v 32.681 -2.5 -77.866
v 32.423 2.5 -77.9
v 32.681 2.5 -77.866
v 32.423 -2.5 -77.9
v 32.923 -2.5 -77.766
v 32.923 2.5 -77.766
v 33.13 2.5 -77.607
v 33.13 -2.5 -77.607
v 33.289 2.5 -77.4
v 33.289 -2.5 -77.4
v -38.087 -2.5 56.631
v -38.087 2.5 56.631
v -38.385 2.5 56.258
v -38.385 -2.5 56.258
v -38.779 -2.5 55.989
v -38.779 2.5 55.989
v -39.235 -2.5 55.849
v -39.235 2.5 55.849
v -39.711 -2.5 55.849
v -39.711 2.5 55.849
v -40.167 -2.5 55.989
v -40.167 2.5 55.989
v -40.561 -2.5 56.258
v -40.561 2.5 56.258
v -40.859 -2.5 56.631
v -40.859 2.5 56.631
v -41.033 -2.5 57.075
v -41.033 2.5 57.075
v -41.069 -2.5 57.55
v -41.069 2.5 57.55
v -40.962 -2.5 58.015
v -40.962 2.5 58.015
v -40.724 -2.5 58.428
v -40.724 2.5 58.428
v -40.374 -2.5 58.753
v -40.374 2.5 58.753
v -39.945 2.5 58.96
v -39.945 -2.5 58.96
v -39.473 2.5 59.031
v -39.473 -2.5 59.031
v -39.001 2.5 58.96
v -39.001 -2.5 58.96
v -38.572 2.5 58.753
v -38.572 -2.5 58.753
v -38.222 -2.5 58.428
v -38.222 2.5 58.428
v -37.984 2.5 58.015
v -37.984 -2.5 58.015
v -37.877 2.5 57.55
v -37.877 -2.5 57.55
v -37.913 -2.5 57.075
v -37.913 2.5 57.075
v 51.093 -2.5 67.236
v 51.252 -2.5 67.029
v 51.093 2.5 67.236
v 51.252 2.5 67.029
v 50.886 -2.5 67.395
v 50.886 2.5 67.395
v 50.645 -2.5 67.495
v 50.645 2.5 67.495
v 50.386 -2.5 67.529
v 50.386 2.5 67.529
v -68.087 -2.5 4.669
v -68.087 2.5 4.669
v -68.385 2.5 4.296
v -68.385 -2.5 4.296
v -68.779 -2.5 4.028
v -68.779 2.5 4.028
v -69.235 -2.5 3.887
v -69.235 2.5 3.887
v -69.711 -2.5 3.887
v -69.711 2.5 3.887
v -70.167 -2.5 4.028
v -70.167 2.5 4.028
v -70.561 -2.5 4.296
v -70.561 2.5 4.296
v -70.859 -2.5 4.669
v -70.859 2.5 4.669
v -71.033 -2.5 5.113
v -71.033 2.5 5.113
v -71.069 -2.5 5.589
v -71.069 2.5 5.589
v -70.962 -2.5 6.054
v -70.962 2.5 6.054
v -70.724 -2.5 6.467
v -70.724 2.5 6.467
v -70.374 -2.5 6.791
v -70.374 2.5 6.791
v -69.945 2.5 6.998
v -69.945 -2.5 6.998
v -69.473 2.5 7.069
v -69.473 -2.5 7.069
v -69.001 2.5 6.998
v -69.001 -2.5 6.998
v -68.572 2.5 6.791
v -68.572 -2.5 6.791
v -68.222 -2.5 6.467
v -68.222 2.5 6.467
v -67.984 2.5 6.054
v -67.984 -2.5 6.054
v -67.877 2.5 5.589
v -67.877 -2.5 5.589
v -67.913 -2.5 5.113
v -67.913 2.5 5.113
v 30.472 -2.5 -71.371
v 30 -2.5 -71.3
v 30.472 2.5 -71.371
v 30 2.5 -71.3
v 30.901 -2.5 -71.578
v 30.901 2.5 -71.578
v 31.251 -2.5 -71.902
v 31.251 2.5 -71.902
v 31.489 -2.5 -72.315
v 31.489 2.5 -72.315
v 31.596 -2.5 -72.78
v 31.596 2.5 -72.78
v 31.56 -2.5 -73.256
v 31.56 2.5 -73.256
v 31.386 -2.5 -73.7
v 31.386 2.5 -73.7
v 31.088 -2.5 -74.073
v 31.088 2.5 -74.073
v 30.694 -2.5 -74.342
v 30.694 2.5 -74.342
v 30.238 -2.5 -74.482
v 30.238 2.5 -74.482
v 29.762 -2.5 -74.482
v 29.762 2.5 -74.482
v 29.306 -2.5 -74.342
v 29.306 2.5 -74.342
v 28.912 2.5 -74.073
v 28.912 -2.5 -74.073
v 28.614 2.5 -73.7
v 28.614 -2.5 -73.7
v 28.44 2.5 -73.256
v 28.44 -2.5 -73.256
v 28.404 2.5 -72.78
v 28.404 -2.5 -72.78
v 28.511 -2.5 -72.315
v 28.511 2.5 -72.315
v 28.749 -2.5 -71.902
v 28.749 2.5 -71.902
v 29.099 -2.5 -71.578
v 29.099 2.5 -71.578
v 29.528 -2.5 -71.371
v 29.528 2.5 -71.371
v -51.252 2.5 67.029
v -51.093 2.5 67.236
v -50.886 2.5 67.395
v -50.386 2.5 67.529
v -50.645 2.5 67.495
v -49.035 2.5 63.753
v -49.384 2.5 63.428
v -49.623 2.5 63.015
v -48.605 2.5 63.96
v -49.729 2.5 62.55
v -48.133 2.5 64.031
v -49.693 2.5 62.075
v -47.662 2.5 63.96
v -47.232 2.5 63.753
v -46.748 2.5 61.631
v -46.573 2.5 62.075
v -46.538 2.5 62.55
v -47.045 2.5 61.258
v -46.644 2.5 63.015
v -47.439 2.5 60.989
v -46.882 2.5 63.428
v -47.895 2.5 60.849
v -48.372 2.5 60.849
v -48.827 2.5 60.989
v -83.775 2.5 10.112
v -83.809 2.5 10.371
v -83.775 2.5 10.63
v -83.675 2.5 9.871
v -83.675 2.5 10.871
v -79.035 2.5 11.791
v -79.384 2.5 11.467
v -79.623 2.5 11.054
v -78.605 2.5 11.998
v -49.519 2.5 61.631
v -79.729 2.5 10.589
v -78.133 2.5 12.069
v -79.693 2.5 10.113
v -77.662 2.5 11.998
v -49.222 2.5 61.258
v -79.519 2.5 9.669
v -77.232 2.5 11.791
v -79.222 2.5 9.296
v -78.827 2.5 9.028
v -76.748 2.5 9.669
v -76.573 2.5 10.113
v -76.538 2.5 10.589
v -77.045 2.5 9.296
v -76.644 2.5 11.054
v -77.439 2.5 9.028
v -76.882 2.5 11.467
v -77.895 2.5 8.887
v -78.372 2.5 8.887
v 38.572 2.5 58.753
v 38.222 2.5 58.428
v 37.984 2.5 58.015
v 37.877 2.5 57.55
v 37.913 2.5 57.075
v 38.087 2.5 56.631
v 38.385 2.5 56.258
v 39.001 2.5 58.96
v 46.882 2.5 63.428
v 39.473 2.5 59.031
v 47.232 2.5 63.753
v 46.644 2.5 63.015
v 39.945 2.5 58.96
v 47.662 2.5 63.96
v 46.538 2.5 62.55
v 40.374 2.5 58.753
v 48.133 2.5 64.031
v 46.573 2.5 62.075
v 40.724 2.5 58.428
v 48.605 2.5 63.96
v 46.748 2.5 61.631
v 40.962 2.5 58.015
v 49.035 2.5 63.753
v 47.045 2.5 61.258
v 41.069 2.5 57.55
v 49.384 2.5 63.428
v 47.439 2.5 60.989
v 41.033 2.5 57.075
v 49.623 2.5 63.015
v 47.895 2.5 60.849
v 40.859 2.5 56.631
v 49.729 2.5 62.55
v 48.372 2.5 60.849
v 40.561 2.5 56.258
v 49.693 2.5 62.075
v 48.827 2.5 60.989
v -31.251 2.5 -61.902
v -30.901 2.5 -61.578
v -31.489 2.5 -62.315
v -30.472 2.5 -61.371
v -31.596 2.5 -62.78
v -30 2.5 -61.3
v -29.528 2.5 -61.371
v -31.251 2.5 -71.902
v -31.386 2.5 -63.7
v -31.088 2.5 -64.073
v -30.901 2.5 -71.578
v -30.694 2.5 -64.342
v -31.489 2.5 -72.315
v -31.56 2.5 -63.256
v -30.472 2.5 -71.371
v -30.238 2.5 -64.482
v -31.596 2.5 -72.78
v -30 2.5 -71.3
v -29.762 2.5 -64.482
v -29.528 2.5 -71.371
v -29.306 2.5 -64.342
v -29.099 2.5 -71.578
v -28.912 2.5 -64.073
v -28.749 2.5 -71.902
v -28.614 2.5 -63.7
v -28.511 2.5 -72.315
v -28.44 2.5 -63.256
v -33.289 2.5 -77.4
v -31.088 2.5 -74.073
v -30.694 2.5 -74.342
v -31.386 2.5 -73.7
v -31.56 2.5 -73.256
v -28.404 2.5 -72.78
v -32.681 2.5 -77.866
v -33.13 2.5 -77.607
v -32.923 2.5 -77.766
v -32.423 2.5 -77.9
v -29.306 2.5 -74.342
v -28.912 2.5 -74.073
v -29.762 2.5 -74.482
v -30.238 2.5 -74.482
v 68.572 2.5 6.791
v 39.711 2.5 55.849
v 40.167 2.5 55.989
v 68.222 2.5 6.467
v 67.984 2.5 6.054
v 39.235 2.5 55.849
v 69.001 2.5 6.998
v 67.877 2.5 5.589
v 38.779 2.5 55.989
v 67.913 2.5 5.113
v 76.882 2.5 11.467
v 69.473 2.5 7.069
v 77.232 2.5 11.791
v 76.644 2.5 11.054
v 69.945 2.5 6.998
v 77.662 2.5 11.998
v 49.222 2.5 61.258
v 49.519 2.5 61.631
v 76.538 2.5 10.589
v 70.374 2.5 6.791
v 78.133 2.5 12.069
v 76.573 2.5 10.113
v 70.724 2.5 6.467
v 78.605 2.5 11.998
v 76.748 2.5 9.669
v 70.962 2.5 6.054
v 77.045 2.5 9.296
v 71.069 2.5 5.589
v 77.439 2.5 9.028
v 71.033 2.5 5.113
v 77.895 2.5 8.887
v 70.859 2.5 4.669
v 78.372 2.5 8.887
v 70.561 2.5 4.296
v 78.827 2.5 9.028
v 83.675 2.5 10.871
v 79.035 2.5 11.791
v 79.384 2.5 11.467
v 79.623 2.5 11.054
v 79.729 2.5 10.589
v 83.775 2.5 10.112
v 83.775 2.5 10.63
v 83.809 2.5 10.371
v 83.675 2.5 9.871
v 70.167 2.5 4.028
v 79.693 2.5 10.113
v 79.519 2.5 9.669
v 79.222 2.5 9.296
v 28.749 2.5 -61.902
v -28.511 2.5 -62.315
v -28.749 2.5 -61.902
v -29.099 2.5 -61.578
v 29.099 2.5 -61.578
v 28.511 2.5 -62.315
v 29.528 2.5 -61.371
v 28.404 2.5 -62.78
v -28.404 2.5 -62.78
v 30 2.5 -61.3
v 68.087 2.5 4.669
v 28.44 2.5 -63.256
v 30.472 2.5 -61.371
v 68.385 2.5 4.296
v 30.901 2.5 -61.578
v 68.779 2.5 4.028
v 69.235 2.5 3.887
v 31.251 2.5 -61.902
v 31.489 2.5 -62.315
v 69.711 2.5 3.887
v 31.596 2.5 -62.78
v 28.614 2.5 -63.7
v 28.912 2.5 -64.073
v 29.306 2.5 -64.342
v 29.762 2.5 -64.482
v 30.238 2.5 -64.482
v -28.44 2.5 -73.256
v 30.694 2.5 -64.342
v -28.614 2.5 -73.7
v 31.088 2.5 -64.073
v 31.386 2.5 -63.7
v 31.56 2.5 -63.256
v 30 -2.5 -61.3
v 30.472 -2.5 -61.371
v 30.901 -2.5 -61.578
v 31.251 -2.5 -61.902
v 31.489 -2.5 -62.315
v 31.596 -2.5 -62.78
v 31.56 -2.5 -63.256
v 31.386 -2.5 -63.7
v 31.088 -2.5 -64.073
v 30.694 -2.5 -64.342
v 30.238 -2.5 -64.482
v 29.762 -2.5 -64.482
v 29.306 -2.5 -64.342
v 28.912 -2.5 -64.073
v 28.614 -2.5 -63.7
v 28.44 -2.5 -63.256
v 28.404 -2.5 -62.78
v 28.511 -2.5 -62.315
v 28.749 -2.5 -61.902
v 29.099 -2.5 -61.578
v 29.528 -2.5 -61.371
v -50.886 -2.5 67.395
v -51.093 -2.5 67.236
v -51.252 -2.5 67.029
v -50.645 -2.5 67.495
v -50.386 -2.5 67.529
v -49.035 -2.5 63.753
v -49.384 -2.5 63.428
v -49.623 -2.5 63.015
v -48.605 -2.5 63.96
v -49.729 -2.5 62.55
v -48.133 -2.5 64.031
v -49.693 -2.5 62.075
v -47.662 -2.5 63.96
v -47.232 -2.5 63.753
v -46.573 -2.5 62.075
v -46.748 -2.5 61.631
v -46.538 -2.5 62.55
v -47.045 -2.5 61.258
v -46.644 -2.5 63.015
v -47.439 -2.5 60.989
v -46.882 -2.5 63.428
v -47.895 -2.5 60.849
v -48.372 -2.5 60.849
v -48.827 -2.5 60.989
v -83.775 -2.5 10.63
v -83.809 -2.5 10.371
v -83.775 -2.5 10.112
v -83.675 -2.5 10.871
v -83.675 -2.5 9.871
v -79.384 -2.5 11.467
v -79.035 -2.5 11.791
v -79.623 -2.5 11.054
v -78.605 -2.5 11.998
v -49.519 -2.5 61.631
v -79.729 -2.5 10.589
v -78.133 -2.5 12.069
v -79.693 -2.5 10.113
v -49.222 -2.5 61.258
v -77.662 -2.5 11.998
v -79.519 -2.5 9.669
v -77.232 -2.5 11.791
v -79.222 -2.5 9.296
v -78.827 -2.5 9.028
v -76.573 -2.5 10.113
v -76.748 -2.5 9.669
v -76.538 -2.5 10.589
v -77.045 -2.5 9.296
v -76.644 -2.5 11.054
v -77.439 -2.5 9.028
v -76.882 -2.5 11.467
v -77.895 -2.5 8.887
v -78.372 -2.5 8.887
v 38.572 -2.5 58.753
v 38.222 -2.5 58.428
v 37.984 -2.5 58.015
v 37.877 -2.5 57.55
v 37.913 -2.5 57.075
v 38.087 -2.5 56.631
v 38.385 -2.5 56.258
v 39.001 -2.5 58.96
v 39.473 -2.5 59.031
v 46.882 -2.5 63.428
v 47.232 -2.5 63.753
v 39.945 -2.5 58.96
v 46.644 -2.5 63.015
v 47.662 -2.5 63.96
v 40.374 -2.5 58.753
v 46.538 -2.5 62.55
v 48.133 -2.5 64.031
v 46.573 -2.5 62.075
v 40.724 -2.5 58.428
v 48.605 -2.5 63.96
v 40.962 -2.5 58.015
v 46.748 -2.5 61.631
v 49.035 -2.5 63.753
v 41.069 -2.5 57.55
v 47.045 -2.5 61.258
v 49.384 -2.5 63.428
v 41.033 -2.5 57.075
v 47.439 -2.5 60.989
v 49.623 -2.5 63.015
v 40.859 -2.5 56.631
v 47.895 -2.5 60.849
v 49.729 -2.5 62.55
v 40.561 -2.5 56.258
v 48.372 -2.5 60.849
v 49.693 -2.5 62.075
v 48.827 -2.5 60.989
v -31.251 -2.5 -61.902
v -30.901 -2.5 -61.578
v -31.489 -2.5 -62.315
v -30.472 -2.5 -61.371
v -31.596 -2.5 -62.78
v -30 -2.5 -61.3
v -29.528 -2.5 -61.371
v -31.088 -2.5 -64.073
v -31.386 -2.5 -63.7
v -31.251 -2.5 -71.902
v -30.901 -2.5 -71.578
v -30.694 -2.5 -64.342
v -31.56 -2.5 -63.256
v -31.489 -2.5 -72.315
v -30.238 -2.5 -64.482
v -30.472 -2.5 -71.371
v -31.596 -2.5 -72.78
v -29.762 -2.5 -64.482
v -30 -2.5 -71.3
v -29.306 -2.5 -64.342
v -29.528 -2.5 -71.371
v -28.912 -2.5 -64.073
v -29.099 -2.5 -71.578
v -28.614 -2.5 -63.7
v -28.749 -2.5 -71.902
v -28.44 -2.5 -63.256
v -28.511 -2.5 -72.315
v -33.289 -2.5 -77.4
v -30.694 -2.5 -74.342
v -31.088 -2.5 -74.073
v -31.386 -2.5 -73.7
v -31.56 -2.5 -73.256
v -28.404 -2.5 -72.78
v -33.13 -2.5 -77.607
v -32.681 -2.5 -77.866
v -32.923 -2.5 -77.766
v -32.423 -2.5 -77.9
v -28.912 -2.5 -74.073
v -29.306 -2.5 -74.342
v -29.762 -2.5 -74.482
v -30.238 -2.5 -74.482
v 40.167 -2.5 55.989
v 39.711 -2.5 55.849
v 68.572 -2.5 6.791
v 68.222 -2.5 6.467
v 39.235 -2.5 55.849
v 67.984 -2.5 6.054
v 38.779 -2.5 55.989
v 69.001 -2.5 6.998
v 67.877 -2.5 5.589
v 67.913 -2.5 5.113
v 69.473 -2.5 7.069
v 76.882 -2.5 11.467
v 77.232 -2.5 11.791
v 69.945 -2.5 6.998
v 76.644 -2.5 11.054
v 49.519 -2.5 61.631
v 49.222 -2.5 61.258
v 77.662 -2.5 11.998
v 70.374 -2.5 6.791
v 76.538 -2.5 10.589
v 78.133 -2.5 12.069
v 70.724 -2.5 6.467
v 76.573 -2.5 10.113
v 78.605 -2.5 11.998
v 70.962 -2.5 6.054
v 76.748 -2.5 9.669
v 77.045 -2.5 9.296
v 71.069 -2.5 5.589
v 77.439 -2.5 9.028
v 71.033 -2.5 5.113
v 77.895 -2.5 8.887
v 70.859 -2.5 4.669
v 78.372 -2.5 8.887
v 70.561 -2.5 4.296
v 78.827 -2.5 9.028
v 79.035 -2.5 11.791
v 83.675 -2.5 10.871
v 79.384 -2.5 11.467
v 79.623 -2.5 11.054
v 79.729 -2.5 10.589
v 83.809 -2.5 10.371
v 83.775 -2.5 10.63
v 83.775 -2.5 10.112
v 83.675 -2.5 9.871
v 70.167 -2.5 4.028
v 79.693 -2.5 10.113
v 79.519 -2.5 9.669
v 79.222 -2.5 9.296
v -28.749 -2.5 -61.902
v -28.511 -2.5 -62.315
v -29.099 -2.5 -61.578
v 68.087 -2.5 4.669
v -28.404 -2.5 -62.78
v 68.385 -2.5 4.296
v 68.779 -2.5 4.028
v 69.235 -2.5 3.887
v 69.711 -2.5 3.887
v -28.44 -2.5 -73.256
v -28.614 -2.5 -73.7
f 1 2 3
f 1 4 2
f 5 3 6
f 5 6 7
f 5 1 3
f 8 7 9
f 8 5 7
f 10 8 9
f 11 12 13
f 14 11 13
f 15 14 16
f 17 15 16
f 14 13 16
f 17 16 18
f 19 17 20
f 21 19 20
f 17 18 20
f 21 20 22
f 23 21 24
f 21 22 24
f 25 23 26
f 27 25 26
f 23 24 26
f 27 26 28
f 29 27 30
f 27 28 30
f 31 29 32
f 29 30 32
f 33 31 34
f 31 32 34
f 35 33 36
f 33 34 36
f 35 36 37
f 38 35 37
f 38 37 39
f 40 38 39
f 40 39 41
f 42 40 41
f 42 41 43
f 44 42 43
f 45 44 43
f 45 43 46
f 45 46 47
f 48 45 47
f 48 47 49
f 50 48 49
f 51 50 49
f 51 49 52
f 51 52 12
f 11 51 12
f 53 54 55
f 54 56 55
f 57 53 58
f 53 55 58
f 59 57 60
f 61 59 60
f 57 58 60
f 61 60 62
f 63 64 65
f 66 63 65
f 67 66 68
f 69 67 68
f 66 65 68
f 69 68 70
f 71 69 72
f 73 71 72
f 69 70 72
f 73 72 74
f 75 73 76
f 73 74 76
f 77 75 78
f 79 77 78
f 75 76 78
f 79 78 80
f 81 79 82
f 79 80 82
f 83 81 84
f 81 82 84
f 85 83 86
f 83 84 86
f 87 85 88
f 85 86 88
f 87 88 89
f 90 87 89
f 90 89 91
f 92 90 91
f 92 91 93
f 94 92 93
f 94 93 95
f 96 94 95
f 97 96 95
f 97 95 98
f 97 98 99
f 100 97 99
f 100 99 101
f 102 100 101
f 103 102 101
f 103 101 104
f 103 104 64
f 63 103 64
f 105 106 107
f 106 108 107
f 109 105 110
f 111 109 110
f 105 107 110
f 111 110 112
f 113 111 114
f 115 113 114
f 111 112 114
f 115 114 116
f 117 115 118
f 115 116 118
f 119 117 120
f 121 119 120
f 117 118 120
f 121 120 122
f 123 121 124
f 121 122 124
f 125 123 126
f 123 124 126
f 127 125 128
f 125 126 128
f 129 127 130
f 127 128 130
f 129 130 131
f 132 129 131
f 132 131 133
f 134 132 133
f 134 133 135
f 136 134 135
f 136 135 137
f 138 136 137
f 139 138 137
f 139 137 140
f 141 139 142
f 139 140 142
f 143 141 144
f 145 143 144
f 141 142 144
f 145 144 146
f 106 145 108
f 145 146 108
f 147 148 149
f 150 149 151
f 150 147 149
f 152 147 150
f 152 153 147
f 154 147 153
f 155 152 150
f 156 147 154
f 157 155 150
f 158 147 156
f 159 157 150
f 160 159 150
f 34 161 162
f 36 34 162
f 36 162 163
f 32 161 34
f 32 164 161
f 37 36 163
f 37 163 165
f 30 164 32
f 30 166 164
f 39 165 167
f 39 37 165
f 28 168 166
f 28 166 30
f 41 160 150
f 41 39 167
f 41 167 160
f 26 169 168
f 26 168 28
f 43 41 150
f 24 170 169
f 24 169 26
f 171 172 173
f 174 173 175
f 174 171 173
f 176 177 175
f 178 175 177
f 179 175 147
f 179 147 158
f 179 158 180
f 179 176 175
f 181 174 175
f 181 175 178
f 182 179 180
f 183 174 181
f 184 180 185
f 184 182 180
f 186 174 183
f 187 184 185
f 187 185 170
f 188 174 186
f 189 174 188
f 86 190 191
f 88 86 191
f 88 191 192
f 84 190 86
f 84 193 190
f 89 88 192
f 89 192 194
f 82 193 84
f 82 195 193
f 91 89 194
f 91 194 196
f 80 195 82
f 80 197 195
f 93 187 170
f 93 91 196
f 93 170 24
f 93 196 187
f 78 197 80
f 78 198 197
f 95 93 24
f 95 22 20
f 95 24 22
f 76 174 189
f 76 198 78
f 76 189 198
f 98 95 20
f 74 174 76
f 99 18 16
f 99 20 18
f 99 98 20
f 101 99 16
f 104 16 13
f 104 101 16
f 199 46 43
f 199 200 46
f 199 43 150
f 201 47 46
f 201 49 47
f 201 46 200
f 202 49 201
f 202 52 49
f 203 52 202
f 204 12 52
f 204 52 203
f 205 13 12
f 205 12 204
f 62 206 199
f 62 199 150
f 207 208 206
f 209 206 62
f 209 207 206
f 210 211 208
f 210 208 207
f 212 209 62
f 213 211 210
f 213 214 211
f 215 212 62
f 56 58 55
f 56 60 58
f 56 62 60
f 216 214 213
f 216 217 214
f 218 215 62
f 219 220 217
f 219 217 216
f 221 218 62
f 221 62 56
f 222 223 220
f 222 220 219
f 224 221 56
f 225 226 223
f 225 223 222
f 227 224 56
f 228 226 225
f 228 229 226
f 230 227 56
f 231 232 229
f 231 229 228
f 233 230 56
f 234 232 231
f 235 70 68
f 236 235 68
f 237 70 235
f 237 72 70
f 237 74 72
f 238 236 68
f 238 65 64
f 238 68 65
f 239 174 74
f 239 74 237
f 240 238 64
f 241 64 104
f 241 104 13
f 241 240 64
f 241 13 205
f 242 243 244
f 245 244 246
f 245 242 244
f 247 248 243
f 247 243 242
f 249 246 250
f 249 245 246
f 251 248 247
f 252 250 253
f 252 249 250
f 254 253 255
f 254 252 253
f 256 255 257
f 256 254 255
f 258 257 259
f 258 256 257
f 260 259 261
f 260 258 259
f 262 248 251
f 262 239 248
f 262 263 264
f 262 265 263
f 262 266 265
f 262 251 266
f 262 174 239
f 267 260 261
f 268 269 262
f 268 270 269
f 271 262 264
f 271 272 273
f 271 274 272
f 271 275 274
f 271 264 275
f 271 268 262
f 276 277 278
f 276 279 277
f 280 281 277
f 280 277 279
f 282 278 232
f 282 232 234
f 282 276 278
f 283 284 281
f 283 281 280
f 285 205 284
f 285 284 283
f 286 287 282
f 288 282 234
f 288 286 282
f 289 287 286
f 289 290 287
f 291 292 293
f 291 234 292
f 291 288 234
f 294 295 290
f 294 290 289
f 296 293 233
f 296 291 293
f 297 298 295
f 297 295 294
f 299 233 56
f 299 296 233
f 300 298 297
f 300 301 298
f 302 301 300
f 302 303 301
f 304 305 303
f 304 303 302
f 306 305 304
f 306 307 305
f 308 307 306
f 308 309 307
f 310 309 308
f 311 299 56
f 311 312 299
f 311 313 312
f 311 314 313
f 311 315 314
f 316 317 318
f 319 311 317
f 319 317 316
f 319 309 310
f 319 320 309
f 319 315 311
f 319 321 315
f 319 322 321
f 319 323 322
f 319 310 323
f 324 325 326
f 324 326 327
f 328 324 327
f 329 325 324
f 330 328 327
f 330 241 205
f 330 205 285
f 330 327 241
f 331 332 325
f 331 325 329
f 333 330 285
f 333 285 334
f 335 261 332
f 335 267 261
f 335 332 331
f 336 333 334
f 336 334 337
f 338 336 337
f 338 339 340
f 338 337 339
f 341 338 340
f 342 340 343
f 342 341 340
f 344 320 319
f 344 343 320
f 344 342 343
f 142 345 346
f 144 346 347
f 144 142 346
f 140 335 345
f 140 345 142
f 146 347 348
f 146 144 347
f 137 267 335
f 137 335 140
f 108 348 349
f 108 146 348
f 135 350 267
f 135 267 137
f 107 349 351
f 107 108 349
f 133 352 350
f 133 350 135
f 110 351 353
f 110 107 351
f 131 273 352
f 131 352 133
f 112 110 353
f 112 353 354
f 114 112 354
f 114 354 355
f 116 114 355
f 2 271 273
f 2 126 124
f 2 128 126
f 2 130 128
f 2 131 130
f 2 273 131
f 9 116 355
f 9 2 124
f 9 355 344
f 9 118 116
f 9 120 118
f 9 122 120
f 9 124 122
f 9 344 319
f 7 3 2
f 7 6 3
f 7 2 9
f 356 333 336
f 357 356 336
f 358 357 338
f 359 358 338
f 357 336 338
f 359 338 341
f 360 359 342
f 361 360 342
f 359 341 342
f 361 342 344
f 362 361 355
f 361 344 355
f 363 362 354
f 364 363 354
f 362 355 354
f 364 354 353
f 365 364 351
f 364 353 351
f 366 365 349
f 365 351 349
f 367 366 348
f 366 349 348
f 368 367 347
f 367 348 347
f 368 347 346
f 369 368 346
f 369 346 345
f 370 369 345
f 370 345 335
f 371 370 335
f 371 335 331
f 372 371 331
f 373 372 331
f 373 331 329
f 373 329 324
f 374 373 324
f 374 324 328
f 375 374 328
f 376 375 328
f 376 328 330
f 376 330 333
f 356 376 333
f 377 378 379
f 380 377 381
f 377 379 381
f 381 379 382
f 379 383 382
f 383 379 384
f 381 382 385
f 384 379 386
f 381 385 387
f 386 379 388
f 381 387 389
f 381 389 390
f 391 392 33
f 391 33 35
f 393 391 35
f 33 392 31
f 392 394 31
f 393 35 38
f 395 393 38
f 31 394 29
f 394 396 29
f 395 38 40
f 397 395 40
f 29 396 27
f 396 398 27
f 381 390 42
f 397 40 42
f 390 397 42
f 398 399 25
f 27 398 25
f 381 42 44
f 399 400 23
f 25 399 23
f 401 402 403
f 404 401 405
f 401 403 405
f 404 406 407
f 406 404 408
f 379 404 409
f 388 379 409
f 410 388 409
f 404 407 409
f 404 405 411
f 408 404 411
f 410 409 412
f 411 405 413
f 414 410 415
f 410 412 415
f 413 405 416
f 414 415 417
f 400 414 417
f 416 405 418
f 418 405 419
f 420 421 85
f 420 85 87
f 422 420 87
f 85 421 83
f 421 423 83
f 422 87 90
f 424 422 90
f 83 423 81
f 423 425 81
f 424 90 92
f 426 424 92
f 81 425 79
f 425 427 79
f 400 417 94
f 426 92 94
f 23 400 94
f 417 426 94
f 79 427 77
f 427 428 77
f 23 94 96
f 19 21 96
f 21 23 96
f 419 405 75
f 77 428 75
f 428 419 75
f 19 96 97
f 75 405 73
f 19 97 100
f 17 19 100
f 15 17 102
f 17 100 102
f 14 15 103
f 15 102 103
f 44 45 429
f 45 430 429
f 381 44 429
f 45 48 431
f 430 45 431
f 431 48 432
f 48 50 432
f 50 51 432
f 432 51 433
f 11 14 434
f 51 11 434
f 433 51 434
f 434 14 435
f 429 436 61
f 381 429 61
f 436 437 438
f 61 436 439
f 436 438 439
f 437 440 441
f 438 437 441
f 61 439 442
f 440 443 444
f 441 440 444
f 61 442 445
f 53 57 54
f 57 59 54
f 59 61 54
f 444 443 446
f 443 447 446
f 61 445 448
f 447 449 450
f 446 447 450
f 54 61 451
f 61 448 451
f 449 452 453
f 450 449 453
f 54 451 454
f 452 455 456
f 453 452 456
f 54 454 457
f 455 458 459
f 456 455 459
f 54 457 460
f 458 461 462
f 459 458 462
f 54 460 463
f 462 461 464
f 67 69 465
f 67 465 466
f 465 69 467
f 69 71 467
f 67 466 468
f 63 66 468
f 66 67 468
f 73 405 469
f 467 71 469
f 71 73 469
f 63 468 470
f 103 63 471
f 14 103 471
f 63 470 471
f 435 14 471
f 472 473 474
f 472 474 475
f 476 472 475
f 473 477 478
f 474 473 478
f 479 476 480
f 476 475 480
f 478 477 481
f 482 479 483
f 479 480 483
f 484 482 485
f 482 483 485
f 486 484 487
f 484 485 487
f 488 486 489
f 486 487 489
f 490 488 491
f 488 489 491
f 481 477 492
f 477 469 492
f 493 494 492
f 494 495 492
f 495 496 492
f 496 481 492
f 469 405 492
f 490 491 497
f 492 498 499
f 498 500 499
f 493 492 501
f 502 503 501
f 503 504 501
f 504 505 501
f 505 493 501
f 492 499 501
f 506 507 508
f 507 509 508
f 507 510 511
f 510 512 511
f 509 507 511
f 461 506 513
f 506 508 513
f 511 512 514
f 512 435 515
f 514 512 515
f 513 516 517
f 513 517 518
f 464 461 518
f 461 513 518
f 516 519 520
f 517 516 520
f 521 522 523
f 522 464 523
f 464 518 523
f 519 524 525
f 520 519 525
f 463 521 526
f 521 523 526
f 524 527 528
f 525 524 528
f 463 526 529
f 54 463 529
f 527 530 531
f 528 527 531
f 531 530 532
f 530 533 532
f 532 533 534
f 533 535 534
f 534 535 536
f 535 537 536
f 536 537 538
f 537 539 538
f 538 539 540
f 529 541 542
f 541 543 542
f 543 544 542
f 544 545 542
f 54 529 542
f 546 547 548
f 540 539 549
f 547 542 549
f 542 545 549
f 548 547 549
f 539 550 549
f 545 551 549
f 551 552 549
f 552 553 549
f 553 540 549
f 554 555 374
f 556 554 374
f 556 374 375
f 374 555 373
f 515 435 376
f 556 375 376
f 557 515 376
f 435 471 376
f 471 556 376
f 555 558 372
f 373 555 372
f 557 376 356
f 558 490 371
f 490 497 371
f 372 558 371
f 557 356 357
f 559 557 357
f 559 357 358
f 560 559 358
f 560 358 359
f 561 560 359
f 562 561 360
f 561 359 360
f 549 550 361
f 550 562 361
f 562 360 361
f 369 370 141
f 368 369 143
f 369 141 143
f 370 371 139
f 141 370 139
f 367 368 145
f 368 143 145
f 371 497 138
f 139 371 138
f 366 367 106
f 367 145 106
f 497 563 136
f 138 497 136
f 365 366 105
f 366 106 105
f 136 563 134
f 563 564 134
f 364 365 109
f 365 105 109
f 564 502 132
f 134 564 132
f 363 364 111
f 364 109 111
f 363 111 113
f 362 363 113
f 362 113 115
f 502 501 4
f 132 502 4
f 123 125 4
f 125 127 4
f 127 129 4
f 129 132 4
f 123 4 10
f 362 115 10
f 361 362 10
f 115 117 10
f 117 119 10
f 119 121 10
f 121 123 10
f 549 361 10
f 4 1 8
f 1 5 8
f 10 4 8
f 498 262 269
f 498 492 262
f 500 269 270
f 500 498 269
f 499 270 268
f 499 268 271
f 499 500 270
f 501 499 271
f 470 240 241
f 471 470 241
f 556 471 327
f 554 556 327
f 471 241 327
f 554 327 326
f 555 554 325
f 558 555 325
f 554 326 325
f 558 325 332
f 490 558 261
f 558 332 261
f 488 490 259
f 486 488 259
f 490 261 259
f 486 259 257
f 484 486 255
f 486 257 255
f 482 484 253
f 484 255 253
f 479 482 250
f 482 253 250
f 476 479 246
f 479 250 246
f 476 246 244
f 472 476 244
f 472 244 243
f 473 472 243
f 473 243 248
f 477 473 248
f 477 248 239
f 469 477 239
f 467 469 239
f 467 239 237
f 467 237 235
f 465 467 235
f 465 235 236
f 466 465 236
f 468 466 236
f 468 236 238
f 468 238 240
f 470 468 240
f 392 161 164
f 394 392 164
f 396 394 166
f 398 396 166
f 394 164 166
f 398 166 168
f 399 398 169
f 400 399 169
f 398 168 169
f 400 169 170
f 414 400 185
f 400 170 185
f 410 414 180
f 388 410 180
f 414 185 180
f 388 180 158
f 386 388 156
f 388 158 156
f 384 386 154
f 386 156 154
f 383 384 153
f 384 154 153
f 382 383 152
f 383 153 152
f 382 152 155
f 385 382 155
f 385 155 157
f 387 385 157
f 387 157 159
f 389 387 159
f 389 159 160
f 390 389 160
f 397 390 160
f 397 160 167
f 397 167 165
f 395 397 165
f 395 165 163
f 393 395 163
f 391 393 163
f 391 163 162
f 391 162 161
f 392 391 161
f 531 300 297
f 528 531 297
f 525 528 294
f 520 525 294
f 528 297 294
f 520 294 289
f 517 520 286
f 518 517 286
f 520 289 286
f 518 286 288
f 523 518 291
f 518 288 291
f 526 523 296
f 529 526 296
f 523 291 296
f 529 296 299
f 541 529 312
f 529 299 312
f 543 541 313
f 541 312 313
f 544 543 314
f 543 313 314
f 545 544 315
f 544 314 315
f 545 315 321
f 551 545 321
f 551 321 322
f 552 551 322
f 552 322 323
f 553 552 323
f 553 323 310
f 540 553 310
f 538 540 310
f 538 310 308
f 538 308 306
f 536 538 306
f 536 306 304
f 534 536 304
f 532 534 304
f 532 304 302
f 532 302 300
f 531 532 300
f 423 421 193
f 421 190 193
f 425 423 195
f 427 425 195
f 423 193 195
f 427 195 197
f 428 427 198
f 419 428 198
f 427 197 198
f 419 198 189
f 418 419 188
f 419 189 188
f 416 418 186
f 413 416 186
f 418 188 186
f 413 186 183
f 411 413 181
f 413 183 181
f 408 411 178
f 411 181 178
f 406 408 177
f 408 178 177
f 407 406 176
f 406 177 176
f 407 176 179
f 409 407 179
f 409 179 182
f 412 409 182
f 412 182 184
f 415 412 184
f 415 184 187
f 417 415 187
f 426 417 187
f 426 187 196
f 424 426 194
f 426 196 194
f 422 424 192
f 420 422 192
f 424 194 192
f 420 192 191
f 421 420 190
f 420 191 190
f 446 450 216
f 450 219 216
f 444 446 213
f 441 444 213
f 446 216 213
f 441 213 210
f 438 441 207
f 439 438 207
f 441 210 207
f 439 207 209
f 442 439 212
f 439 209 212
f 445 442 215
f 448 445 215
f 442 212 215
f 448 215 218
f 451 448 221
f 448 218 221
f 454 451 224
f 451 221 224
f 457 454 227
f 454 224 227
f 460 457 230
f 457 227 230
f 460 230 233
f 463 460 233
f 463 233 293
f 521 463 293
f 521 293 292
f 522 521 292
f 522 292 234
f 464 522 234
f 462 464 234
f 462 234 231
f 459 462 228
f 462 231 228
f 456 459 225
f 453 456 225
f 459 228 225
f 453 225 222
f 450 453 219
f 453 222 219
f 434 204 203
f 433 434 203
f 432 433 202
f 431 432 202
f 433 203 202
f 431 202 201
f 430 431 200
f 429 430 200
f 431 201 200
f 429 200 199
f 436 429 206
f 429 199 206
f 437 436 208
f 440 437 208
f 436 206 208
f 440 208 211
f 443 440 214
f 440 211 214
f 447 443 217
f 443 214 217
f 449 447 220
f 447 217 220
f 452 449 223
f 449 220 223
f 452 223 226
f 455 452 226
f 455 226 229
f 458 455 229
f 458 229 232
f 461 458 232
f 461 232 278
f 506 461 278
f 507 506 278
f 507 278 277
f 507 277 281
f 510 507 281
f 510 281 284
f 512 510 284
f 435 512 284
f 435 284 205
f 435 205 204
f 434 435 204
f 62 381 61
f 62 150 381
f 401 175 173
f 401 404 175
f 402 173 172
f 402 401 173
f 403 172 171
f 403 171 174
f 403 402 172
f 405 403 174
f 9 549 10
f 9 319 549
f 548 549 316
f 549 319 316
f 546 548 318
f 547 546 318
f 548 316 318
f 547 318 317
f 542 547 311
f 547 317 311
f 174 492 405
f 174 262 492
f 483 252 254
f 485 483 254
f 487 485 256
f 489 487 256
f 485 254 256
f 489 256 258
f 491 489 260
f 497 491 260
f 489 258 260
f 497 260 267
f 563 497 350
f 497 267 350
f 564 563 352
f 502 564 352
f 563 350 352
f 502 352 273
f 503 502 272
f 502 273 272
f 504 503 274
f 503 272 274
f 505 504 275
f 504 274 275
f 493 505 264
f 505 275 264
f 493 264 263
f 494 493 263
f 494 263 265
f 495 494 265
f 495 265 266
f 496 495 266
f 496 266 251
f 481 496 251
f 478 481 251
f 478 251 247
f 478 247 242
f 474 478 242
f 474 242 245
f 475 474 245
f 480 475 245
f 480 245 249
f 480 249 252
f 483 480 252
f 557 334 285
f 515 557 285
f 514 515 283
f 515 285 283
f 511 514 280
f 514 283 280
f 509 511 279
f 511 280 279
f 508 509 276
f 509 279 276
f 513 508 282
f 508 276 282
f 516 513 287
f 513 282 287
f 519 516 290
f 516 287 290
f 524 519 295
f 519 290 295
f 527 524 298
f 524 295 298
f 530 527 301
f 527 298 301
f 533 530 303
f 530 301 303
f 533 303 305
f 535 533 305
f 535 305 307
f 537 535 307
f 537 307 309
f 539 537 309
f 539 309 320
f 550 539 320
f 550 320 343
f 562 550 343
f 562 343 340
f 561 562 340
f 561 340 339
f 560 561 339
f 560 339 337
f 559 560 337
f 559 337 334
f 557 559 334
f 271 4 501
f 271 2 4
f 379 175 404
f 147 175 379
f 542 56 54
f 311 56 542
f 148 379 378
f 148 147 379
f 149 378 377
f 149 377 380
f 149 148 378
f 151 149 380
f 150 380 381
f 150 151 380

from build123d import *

# Parameters (mm, degrees)
EXTRUDE_1_DEPTH          = 2.5
FILLET_1_R               = 1
SKETCH_3_R               = 1.6
CUT_EXTRUDE_1_DEPTH      = 115.530801874
PATTERN_CIRCULAR_1_COUNT = 3


with BuildPart() as part:
    # ｽｹｯﾁ2 → ﾎﾞｽ - 押し出し1 (new, symmetric)
    with BuildSketch(Plane(origin=(0, 0, 0), x_dir=(1, 0, 0), z_dir=(0, 1, 0))):
        Polygon((-83.963378955, -10.371161675), (-50.963378955, -67.528838325), (50.963378955, -67.528838325), (83.963378955, -10.371161675), (33, 77.9), (-33, 77.9), align=None)
    extrude(amount=EXTRUDE_1_DEPTH, both=True)

    # ﾌｨﾚｯﾄ1
    fillet_1_edges = [part.edges().sort_by_distance(p)[0] for p in [
        (-33, 0, -77.9),
        (33, 0, -77.9),
        (83.963378955, 0, 10.371161675),
        (50.963378955, 0, 67.528838325),
        (-83.963378955, 0, 10.371161675),
        (-50.963378955, 0, 67.528838325),
    ]]
    fillet(fillet_1_edges, radius=FILLET_1_R)

    # ｽｹｯﾁ3 → ｶｯﾄ - 押し出し1 (cut, symmetric)
    with BuildSketch(Plane(origin=(0, 2.5, 0), x_dir=(1, 0, 0), z_dir=(0, 1, 0))):
        with Locations((-30, 72.9)):
            Circle(SKETCH_3_R)
        with Locations((-30, 62.9)):
            Circle(SKETCH_3_R)
        with Locations((30, 62.9)):
            Circle(SKETCH_3_R)
        with Locations((30, 72.9)):
            Circle(SKETCH_3_R)
    cut_extrude_1 = extrude(amount=CUT_EXTRUDE_1_DEPTH, both=True, mode=Mode.SUBTRACT)

    # 円形ﾊﾟﾀｰﾝ1: ｶｯﾄ - 押し出し1 ×3 about axis
    pattern_circular_1_axis = Axis((0, 2.75, 0), (0, -1, 0))
    for i in range(1, PATTERN_CIRCULAR_1_COUNT):
        add(cut_extrude_1.rotate(pattern_circular_1_axis, i * 360 / PATTERN_CIRCULAR_1_COUNT), mode=Mode.SUBTRACT)


solid = part.part
